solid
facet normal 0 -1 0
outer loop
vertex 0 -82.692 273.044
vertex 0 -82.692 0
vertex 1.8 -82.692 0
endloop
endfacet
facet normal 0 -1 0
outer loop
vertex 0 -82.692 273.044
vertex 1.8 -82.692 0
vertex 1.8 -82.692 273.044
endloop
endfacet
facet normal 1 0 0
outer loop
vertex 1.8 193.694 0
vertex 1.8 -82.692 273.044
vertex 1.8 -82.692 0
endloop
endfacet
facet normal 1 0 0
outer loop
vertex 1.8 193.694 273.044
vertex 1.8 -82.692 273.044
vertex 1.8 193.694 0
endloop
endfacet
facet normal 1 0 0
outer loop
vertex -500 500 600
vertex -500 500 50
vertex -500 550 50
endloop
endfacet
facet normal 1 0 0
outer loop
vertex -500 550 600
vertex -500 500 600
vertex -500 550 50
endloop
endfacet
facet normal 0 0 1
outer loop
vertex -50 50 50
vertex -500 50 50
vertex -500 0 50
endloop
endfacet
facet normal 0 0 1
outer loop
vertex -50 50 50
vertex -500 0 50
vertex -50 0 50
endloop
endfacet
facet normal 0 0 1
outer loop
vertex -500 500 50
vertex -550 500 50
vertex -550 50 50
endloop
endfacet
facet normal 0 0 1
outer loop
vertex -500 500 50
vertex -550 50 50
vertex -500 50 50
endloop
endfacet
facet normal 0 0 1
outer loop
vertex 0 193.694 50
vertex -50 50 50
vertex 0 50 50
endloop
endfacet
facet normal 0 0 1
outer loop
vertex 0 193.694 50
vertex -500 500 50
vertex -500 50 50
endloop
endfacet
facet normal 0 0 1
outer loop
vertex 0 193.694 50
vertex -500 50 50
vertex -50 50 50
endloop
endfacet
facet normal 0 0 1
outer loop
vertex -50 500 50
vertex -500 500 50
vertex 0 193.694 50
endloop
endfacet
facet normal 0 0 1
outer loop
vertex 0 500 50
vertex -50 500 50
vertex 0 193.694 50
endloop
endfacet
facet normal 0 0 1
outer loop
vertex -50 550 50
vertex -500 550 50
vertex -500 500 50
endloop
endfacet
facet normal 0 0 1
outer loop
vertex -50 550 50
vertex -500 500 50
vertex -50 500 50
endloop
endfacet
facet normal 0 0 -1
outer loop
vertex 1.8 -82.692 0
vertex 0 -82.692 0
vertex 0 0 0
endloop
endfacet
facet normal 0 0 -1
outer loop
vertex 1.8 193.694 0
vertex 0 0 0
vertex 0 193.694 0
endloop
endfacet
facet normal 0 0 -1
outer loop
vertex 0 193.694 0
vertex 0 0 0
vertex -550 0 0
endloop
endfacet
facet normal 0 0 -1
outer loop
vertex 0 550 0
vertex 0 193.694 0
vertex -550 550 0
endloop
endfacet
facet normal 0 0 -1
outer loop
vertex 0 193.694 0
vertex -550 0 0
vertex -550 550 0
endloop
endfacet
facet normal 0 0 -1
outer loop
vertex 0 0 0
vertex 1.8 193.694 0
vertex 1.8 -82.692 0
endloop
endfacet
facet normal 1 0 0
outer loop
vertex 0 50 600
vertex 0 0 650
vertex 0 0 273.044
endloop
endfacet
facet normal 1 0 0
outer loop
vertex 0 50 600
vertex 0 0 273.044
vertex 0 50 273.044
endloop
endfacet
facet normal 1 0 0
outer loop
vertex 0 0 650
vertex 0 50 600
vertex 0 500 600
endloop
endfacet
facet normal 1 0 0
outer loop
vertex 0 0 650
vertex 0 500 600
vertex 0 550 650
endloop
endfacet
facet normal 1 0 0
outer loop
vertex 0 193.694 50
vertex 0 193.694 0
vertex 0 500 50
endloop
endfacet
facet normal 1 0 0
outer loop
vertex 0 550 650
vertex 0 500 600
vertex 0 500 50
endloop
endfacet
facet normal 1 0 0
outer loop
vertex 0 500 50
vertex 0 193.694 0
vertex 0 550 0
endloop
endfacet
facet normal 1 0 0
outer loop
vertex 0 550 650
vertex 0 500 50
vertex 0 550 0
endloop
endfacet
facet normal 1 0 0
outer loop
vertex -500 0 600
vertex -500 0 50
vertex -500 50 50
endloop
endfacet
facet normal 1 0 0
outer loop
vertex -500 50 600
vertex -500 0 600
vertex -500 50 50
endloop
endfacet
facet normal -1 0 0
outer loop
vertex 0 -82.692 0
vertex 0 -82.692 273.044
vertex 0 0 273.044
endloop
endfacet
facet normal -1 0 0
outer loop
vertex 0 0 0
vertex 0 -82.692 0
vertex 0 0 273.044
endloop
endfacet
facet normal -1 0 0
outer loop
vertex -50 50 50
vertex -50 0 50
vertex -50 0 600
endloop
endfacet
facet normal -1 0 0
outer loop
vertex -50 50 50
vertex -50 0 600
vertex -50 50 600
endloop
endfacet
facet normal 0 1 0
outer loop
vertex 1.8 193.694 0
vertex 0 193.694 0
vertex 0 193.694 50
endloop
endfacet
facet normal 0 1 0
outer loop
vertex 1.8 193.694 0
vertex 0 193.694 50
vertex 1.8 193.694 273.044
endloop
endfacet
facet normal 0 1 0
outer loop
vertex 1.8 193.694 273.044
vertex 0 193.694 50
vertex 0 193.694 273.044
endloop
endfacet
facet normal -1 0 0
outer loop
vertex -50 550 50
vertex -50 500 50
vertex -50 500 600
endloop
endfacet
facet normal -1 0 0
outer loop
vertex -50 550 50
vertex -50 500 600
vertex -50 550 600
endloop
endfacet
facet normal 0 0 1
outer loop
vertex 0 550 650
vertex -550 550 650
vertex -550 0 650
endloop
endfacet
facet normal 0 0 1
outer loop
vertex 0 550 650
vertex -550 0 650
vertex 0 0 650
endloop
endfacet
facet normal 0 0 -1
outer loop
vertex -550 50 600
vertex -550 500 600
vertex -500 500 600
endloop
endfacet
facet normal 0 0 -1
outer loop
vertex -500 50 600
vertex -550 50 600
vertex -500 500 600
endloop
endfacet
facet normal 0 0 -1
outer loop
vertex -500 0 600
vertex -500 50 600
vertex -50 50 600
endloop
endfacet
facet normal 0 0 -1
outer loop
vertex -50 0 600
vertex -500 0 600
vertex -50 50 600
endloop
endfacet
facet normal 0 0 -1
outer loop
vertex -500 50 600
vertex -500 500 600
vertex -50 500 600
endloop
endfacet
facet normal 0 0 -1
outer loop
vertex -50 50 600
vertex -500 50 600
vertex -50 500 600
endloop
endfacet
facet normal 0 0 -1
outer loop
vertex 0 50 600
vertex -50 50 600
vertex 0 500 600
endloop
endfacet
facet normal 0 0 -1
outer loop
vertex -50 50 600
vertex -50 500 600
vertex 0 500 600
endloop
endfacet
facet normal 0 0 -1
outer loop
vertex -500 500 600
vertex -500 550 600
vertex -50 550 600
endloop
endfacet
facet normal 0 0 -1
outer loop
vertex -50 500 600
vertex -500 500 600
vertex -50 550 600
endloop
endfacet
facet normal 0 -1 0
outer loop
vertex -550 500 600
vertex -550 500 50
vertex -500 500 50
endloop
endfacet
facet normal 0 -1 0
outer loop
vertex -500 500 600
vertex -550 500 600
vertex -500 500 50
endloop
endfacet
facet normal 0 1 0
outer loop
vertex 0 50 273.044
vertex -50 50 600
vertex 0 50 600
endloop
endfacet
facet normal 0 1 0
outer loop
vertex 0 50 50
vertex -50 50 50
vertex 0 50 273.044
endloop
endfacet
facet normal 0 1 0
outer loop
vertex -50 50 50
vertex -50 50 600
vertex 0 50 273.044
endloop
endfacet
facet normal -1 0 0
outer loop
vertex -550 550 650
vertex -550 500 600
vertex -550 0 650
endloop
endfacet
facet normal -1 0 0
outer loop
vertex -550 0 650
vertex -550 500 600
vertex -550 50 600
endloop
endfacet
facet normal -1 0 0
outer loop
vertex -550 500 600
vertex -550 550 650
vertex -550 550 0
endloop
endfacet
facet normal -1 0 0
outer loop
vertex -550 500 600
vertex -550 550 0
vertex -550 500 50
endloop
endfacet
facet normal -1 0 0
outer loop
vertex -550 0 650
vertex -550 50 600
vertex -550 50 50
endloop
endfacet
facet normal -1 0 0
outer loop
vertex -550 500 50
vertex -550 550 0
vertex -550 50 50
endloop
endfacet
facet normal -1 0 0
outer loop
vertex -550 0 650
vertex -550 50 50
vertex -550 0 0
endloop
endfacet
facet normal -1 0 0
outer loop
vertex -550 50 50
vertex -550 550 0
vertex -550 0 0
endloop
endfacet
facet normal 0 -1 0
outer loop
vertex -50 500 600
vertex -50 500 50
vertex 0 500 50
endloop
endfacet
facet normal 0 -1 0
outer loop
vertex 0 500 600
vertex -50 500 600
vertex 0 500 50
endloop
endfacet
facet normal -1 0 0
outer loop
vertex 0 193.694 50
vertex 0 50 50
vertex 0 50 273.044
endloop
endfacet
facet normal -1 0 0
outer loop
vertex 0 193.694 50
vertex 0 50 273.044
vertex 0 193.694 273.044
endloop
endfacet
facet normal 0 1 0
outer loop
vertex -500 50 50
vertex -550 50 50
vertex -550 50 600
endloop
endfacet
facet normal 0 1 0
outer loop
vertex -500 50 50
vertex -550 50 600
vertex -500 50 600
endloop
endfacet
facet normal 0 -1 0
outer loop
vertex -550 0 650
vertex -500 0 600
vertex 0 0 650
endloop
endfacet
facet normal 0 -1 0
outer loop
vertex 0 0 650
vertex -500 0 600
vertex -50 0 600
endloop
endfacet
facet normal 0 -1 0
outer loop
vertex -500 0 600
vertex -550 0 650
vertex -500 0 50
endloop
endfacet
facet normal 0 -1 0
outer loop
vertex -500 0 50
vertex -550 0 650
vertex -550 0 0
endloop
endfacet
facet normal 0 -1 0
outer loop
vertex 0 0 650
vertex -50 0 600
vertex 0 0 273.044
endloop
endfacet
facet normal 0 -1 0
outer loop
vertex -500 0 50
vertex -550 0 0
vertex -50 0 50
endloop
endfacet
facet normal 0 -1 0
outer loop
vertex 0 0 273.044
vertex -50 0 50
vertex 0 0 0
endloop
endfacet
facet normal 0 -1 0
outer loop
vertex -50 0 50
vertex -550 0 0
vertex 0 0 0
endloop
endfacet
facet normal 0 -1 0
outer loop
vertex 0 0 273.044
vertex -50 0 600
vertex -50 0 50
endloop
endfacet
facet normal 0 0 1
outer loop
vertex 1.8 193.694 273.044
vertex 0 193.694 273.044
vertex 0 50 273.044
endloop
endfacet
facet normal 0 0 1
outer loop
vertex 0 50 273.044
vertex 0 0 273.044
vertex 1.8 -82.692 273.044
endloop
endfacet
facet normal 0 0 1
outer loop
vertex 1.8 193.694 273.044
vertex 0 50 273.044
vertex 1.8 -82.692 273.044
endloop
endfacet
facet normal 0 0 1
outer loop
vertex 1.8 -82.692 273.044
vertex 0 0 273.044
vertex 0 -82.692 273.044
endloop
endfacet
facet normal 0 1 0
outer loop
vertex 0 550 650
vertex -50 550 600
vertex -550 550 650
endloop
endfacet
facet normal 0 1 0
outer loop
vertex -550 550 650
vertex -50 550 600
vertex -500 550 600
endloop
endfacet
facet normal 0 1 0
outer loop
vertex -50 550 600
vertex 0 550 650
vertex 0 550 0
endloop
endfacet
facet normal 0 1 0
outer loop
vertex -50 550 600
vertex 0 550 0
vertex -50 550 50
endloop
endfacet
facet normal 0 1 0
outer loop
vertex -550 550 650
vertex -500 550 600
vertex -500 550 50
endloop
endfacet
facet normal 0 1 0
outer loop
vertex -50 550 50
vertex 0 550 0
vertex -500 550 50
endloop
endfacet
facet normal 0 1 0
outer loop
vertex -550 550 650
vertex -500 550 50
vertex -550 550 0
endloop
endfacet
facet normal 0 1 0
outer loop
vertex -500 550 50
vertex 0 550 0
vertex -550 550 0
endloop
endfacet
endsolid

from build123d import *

# Parameters (mm, degrees)
F0_W     = 550
F0_H     = 550
F1_DEPTH = 50
F2_W     = 50
F2_H     = 50
F3_DEPTH = 550
F4_W     = 50
F4_H     = 50
F5_DEPTH = 50
F6_W     = 82.6920196414
F6_H     = 273.0440795422
F6_W_2   = 143.6941742897
F6_H_2   = 223.0440795422
F7_DEPTH = 1.8


with BuildPart() as f1:
    # F0 (on Top) → F1 (new body)
    with BuildSketch(Plane.XY):
        with Locations((-275, 275)):
            Rectangle(F0_W, F0_H)
    extrude(amount=F1_DEPTH)

    # F2 (on face) → F3 (join)
    with BuildSketch(Plane.XY.offset(50)):
        with Locations((-525, 525)):
            Rectangle(F2_W, F2_H)
        with Locations((-525, 25)):
            Rectangle(F2_W, F2_H)
        with Locations((-25, 25)):
            Rectangle(F2_W, F2_H)
        with Locations((-25, 525)):
            Rectangle(F2_W, F2_H)
    extrude(amount=F3_DEPTH)

    # F4 (on face) → F5 (join)
    with BuildSketch(Plane.XY.offset(600)):
        with Locations((-525, 525)):
            Rectangle(F4_W, F4_H)
        Polygon((0, 550), (-500, 550), (-500, 500), (-550, 500), (-550, 0), (0, 0), align=None)
    extrude(amount=F5_DEPTH)

    # F6 (on face) → F7 (join)
    with BuildSketch(Plane.YZ):
        with Locations((-41.3460098207, 136.5220397711)):
            Rectangle(F6_W, F6_H)
        Polygon((0, 0), (193.6941742897, 0), (193.6941742897, 50), (50, 50), (50, 273.0440795422), (0, 273.0440795422), align=None)
        with Locations((121.8470871449, 161.5220397711)):
            Rectangle(F6_W_2, F6_H_2)
    extrude(amount=F7_DEPTH)


solid = f1.part
